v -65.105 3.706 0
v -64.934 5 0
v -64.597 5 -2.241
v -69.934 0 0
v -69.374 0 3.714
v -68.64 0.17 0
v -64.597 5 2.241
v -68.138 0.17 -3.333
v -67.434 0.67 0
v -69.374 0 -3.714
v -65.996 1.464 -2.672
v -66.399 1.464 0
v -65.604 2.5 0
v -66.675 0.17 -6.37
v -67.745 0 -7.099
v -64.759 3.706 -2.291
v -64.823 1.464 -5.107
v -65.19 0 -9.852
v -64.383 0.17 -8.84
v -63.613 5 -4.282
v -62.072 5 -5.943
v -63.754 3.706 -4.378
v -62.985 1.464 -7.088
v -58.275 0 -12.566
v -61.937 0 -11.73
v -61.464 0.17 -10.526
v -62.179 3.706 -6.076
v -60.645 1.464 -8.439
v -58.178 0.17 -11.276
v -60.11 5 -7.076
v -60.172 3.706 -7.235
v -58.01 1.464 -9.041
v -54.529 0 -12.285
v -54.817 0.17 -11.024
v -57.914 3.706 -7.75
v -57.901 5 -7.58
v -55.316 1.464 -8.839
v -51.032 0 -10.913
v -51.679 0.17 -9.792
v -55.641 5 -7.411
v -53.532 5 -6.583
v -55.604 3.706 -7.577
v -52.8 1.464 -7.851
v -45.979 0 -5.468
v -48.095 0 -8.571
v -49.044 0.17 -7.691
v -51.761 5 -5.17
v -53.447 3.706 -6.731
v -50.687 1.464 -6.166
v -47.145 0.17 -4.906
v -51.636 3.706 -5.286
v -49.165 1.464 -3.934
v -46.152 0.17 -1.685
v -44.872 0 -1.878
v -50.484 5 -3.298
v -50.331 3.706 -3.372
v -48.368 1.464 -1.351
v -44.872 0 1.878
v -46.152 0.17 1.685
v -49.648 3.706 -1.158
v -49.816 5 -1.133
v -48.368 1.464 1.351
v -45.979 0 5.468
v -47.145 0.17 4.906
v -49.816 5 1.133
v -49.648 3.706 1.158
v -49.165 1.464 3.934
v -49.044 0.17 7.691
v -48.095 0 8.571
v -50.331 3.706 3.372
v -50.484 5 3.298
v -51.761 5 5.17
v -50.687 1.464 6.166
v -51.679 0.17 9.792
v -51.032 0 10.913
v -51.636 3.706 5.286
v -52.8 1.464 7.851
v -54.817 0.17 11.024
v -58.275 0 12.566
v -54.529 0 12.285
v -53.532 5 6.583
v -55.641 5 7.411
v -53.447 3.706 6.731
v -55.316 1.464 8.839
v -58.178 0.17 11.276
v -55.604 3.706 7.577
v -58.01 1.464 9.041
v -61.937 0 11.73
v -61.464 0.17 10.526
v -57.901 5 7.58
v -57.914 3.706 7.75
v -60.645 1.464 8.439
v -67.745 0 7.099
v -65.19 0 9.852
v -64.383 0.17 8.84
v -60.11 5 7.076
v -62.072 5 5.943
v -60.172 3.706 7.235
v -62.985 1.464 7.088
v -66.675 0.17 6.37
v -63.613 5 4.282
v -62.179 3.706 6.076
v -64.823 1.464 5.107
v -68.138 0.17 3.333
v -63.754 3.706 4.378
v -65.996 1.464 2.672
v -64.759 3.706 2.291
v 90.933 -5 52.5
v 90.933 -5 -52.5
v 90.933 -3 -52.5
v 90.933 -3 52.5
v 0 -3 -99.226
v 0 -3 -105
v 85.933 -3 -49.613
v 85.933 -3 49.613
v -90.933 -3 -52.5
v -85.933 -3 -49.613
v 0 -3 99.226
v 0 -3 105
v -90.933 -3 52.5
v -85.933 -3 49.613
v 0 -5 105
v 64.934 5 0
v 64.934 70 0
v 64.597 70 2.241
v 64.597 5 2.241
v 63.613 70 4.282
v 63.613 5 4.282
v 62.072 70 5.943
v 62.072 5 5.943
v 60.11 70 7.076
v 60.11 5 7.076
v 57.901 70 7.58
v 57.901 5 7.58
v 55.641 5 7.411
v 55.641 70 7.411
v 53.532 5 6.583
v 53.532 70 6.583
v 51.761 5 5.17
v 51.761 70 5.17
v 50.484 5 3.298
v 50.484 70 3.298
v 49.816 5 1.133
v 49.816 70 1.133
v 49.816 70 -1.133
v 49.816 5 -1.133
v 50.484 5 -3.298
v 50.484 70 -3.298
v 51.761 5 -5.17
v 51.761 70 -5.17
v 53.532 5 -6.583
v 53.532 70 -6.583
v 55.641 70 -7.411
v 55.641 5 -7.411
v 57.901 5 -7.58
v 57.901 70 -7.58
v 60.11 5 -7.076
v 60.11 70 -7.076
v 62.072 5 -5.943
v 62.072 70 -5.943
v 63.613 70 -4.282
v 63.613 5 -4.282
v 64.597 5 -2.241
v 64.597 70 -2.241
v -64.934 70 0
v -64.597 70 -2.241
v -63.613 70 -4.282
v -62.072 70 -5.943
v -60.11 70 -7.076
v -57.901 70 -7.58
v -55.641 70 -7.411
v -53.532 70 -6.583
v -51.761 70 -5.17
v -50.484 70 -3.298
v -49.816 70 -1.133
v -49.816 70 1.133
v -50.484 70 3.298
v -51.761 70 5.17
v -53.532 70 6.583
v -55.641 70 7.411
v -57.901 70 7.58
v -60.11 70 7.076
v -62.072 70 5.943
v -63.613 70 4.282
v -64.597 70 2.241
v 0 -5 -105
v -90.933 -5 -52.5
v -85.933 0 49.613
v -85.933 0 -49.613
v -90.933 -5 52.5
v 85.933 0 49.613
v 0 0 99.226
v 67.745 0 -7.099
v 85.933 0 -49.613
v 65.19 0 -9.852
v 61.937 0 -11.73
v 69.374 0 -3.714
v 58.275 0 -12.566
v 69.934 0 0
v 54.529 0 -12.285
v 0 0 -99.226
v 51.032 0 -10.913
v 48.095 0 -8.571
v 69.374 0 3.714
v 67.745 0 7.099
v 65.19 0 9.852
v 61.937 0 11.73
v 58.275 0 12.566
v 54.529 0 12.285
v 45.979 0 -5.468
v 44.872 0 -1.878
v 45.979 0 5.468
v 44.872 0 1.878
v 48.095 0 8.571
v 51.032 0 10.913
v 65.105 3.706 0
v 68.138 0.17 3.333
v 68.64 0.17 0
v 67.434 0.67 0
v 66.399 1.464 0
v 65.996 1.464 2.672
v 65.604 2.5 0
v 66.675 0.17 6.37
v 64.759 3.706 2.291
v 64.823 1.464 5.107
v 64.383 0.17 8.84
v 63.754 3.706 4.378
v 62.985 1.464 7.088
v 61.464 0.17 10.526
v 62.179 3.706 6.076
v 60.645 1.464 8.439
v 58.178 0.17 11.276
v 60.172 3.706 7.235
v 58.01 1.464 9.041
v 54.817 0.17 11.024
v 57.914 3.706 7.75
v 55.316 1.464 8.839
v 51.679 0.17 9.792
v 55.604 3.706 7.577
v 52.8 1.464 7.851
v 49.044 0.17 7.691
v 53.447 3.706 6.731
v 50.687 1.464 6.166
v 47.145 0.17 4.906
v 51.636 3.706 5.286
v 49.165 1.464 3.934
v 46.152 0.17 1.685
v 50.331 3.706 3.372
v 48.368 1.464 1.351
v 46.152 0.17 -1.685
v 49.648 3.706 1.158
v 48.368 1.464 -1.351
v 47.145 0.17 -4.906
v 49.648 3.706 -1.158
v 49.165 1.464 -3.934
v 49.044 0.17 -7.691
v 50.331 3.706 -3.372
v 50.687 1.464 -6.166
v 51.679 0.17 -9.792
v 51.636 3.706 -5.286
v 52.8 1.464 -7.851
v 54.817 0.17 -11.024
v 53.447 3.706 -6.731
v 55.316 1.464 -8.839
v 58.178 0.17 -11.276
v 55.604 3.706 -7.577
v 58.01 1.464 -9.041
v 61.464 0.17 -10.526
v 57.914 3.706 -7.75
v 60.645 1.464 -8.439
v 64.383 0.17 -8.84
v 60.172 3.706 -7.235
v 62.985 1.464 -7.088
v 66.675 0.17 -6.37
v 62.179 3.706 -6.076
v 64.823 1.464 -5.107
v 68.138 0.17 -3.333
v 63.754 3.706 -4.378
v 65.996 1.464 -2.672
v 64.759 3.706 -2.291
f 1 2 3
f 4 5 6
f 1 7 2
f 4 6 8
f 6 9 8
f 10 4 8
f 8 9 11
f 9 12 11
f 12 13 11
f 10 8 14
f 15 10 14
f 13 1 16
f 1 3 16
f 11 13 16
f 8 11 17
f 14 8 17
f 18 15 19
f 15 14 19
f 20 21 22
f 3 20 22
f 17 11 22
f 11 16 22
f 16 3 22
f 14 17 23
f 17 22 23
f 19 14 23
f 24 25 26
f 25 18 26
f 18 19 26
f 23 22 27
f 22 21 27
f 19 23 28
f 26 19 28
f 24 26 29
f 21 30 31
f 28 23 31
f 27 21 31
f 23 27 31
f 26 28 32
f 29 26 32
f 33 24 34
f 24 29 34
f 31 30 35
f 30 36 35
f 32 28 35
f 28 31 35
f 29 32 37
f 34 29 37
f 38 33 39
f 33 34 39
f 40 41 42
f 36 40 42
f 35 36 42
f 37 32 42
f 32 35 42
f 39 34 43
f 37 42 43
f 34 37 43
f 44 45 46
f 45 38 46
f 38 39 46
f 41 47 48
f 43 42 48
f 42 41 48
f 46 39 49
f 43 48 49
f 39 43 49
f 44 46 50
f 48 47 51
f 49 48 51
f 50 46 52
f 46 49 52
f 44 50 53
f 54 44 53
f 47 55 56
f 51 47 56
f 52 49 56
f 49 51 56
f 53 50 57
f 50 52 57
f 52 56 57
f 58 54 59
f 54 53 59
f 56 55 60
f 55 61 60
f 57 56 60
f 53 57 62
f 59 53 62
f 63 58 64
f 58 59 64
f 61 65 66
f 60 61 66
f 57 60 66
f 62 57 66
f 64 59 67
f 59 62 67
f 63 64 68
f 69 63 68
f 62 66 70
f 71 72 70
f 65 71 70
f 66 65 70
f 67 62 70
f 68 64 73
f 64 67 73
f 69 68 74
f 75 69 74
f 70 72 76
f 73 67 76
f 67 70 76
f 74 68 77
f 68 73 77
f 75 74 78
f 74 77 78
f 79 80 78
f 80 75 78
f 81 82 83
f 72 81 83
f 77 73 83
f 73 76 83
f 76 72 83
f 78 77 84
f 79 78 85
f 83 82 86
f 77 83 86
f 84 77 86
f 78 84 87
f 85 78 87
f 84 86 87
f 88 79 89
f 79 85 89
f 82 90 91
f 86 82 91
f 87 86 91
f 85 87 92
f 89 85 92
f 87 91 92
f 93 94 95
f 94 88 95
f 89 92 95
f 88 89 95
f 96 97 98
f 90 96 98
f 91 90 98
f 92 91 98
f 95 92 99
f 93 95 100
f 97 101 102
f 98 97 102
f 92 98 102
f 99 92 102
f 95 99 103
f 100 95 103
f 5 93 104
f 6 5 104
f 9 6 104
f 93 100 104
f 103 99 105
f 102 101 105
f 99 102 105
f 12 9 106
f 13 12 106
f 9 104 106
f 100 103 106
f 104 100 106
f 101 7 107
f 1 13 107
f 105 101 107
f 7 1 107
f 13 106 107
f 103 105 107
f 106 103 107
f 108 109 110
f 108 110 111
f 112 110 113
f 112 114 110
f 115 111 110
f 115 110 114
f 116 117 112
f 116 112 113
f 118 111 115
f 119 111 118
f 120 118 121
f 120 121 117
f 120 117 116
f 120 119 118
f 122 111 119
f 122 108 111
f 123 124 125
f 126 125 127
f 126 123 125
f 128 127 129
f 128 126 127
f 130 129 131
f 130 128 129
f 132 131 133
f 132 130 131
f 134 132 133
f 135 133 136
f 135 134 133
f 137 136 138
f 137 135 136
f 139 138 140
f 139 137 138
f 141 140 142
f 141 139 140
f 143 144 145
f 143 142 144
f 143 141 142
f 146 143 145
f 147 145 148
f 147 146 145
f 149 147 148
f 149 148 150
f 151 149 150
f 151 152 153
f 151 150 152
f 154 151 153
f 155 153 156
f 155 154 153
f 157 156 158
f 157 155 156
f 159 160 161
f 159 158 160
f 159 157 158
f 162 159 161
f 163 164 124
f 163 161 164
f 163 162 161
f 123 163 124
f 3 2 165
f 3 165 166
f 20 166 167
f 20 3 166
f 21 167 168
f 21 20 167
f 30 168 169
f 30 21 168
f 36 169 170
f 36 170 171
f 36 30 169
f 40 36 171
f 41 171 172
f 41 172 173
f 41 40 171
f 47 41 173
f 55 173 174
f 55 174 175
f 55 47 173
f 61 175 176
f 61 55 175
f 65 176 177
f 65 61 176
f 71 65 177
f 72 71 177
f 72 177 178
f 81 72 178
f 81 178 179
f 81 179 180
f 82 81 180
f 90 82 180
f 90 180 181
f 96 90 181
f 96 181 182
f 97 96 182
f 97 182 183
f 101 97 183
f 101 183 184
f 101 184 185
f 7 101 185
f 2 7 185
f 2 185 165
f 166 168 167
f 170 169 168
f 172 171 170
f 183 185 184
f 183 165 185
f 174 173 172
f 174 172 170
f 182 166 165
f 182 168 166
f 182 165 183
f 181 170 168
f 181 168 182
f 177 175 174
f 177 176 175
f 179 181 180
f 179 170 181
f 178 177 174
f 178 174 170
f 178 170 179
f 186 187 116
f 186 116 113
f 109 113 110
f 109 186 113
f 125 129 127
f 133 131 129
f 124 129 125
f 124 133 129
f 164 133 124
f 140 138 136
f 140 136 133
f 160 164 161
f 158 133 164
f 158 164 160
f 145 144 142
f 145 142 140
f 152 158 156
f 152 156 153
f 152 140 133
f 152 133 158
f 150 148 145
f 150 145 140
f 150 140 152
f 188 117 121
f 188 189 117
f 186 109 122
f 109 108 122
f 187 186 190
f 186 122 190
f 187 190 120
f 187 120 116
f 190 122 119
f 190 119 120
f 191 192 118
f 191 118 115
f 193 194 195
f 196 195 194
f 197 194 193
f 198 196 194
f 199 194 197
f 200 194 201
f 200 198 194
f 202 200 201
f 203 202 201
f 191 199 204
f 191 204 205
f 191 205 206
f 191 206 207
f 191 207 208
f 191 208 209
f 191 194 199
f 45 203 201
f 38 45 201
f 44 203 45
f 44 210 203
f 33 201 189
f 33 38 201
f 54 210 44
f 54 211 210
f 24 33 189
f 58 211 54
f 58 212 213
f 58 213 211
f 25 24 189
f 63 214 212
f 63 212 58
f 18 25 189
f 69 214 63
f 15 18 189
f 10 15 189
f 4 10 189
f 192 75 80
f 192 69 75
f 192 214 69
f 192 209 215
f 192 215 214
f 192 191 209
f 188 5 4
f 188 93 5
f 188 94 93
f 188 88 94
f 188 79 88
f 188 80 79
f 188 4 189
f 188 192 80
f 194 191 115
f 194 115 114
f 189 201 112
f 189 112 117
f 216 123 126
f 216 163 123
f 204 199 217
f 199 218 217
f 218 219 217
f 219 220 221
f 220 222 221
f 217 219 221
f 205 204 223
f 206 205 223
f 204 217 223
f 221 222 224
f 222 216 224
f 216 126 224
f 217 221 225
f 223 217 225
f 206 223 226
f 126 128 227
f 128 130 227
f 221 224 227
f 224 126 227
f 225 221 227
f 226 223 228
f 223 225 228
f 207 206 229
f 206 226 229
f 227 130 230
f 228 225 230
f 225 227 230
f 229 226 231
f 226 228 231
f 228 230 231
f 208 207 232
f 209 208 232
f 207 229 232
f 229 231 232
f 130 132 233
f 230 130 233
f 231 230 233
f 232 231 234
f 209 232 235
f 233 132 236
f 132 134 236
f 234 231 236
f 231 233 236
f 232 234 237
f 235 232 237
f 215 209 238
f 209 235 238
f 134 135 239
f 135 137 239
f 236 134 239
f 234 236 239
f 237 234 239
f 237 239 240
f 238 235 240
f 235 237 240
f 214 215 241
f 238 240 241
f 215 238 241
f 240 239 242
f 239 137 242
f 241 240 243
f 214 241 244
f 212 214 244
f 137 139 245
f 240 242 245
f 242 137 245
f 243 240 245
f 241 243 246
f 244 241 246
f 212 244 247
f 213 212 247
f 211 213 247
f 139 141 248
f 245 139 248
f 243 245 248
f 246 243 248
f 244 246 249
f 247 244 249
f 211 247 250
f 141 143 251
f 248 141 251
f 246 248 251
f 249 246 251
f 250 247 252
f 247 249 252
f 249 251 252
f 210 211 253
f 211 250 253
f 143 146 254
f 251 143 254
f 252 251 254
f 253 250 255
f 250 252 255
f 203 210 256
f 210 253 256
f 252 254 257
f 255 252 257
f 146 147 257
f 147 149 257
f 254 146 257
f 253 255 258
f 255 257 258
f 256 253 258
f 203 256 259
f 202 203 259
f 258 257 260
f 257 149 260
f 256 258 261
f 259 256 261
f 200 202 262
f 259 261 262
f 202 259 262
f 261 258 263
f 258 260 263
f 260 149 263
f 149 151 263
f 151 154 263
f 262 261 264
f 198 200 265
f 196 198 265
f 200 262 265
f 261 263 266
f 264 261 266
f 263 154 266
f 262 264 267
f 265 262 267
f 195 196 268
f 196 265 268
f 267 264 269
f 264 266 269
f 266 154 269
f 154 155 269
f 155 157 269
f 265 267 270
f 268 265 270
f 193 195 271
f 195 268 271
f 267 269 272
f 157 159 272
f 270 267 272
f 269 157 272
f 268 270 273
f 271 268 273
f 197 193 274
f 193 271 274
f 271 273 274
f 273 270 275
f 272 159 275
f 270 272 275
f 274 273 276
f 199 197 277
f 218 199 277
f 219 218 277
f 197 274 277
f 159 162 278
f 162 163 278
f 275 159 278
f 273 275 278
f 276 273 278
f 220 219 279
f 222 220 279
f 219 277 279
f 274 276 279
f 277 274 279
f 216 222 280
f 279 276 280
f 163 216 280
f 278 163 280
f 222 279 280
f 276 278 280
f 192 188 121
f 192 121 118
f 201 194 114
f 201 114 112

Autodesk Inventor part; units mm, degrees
ref_plane "XZ Plane" through (0, 0, 0) normal (0, 1, 0) x (-1, 0, 0)
sketch "Sketch2" plane through (0, 0, 0) normal (0, 0, 1) x (1, 0, 0)
  line L0 (0, 0) -> (-38.9815, 0)
  line L1 (-46.3001, 0) -> (-38.9815, 0)
  line L2 (-38.9815, 0) -> (-31.6629, 0)
  line L3 (-49.7315, 70) -> (-64.9343, 70)
  line L4 (-64.9343, 70) -> (-64.9343, 0)
  line L5 (-64.9343, 0) -> (-49.7315, 0)
  line L6 (-49.7315, 0) -> (-49.7315, 70)
  line L7 (-38.9815, 70) -> (-38.9815, 0) construction
  line L8 (-57.3329, 70) -> (-57.3329, 0)
  dimension "d1" = 38.9815
  dimension "d53" = 70
sketch "Sketch3" plane through (0, 0, 0) normal (0, 1, 0) x (-1, 0, 0)
  circle A0 centre (0, 0) radius 105
  circle A1 centre (38.9815, 0) radius 7.3186 projected
  line L0 (0, -105) -> (-90.9327, -52.5)
  line L1 (-90.9327, -52.5) -> (-90.9327, 52.5)
  line L2 (-90.9327, 52.5) -> (0, 105)
  line L3 (0, 105) -> (90.9327, 52.5)
  line L4 (90.9327, 52.5) -> (90.9327, -52.5)
  line L5 (90.9327, -52.5) -> (0, -105)
  line L6 (-85.9327, -49.6132) -> (0, -99.2265)
  line L7 (0, -99.2265) -> (85.9327, -49.6132)
  line L8 (85.9327, -49.6132) -> (85.9327, 49.6132)
  line L9 (85.9327, 49.6132) -> (0, 99.2265)
  line L10 (0, 99.2265) -> (-85.9327, 49.6132)
  line L11 (-85.9327, 49.6132) -> (-85.9327, -49.6132)
  dimension "d14" = 210
  dimension "d15" = 5
extrude "Extrusion3" add sketch "Sketch3" against normal blind 5 contours A1 | L11 L10 L9 L8 L7 L6
extrude "Extrusion4" add sketch "Sketch3" along normal blind 2 from surface at -5 contours L4 L5 L0 L1 L2 L3
sketch "Sketch7" plane through (0, 0, 0) normal (0, 1, 0) x (-1, 0, 0)
  circle A0 centre (57.3329, 0) radius 7.6014
  line L0 (64.9343, 0) -> (49.7315, 0) projected
  point P0 (0, 0)
  point P1 (64.9343, 0)
  point P2 (64.9343, 0)
  point P3 (49.7315, 0)
sweep "Sweep1" add profiles "Sketch7" path "Sketch2" path curves L8
ref_plane "Work Plane1" through (-38.9815, 70, 0) normal (1, 0, 0) x (0, 1, 0)
sketch "Sketch8" plane through (-38.9815, 70, 0) normal (1, 0, 0) x (0, 1, 0)
  point P0 (-70, 0)
sketch "Sketch10" plane through (-38.9815, 70, 0) normal (1, 0, 0) x (0, 1, 0)
  line L0 (0, 0) -> (-25, 0) construction
  circle A0 centre (-25, 0) radius 5.5
  circle A1 centre (-25, 0) radius 9.5
  circle A2 centre (0, 0) radius 25 construction
  circle A3 centre (-19.2628, 15.9356) radius 9.5
  circle A4 centre (-19.2628, 15.9356) radius 5.5
  circle A5 centre (-4.6845, 24.5572) radius 9.5
  circle A6 centre (-4.6845, 24.5572) radius 5.5
  circle A7 centre (12.0438, 21.9077) radius 9.5
  circle A8 centre (12.0438, 21.9077) radius 5.5
  circle A9 centre (23.2444, 9.2031) radius 9.5
  circle A10 centre (23.2444, 9.2031) radius 5.5
  circle A11 centre (23.7764, -7.7254) radius 9.5
  circle A12 centre (23.7764, -7.7254) radius 5.5
  point P0 (-70, 0)
  dimension "d38" = 11
  dimension "d39" = 4
  dimension "d42" = 198
  dimension "d49" = 25
extrude "Extrusion9" [suppressed]
fillet "Fillet5" radius 5 1 edges at (-64.9343, 0, 0)
mirror "Mirror4" about plane through (0, 0, 0) normal (1, 0, 0) of "Sweep1", "Fillet5"
equation "\"d1\" = 0.5 * ballDist"
equation "\"ballDist\" = 77.963"
equation "\"ballDiam\" = 12.7"
equation "\"clearance\" = 0.4"
properties part number "mounter"
